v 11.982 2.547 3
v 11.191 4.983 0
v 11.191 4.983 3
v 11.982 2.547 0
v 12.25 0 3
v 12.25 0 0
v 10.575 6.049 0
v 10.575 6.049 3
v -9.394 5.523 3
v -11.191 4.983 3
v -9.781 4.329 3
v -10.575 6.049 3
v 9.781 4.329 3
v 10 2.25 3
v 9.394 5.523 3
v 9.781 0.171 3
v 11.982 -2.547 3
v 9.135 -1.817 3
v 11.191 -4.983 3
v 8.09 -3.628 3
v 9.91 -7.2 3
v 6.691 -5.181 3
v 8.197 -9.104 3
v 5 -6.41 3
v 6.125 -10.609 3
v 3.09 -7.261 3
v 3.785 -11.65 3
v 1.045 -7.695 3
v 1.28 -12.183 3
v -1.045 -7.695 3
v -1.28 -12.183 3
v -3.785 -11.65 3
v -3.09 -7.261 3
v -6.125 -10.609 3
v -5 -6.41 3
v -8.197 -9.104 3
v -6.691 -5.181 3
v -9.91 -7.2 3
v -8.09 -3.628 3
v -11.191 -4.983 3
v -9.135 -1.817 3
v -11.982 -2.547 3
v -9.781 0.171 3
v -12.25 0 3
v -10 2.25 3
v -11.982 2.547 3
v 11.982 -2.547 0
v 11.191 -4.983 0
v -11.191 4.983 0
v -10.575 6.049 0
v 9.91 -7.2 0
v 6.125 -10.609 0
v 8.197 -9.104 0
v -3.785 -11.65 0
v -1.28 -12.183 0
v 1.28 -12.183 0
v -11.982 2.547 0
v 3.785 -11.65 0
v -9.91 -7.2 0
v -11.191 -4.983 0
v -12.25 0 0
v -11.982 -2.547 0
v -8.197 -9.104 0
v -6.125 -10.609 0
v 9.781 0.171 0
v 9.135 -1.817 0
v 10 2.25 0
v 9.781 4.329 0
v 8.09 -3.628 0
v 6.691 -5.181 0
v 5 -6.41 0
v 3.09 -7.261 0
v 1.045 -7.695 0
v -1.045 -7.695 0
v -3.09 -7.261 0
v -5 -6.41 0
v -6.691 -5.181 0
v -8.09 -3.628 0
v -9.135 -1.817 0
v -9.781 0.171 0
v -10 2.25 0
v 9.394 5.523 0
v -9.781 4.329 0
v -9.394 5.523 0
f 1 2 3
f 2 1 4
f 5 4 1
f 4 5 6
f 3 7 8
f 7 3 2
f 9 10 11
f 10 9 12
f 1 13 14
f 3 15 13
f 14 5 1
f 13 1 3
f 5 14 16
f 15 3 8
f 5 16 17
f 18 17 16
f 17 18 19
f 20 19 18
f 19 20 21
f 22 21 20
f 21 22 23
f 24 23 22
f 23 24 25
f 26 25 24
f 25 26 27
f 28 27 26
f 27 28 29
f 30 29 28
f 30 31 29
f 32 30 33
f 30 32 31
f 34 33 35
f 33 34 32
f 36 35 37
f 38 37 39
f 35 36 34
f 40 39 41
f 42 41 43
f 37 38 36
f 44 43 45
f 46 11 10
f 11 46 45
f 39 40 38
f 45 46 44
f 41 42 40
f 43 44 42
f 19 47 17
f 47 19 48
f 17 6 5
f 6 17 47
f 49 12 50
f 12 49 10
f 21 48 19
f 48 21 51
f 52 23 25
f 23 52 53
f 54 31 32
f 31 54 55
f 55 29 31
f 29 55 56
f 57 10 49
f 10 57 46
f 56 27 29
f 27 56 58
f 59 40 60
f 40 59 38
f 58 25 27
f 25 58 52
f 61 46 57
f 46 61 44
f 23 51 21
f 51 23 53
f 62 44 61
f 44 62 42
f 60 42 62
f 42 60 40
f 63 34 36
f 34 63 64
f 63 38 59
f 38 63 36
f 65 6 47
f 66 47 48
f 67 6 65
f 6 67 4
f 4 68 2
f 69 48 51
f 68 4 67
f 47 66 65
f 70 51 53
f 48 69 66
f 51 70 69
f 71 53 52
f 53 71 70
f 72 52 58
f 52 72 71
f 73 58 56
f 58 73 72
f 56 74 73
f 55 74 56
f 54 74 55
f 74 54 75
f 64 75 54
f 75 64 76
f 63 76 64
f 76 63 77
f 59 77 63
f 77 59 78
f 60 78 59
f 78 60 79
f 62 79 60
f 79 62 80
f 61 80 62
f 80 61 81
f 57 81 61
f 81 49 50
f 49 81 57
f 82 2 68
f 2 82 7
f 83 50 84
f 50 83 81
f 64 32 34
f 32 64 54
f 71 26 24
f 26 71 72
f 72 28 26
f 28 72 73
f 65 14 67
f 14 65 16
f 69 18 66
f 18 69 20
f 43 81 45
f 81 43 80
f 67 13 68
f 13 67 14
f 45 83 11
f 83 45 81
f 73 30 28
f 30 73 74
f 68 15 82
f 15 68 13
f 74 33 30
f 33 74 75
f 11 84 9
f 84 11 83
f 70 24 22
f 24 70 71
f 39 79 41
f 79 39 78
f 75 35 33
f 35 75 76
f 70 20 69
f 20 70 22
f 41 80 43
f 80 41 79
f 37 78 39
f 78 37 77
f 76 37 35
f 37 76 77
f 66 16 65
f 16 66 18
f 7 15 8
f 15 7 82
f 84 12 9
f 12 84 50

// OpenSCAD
difference() {
    difference() {
        cylinder(r=24.5/2,h=3);
        translate([0,4.5/2,0])
            cylinder(r=20.0/2,h=3);
    }

    translate([0,34,0])
        cylinder(r=30.0,h=3);
}
